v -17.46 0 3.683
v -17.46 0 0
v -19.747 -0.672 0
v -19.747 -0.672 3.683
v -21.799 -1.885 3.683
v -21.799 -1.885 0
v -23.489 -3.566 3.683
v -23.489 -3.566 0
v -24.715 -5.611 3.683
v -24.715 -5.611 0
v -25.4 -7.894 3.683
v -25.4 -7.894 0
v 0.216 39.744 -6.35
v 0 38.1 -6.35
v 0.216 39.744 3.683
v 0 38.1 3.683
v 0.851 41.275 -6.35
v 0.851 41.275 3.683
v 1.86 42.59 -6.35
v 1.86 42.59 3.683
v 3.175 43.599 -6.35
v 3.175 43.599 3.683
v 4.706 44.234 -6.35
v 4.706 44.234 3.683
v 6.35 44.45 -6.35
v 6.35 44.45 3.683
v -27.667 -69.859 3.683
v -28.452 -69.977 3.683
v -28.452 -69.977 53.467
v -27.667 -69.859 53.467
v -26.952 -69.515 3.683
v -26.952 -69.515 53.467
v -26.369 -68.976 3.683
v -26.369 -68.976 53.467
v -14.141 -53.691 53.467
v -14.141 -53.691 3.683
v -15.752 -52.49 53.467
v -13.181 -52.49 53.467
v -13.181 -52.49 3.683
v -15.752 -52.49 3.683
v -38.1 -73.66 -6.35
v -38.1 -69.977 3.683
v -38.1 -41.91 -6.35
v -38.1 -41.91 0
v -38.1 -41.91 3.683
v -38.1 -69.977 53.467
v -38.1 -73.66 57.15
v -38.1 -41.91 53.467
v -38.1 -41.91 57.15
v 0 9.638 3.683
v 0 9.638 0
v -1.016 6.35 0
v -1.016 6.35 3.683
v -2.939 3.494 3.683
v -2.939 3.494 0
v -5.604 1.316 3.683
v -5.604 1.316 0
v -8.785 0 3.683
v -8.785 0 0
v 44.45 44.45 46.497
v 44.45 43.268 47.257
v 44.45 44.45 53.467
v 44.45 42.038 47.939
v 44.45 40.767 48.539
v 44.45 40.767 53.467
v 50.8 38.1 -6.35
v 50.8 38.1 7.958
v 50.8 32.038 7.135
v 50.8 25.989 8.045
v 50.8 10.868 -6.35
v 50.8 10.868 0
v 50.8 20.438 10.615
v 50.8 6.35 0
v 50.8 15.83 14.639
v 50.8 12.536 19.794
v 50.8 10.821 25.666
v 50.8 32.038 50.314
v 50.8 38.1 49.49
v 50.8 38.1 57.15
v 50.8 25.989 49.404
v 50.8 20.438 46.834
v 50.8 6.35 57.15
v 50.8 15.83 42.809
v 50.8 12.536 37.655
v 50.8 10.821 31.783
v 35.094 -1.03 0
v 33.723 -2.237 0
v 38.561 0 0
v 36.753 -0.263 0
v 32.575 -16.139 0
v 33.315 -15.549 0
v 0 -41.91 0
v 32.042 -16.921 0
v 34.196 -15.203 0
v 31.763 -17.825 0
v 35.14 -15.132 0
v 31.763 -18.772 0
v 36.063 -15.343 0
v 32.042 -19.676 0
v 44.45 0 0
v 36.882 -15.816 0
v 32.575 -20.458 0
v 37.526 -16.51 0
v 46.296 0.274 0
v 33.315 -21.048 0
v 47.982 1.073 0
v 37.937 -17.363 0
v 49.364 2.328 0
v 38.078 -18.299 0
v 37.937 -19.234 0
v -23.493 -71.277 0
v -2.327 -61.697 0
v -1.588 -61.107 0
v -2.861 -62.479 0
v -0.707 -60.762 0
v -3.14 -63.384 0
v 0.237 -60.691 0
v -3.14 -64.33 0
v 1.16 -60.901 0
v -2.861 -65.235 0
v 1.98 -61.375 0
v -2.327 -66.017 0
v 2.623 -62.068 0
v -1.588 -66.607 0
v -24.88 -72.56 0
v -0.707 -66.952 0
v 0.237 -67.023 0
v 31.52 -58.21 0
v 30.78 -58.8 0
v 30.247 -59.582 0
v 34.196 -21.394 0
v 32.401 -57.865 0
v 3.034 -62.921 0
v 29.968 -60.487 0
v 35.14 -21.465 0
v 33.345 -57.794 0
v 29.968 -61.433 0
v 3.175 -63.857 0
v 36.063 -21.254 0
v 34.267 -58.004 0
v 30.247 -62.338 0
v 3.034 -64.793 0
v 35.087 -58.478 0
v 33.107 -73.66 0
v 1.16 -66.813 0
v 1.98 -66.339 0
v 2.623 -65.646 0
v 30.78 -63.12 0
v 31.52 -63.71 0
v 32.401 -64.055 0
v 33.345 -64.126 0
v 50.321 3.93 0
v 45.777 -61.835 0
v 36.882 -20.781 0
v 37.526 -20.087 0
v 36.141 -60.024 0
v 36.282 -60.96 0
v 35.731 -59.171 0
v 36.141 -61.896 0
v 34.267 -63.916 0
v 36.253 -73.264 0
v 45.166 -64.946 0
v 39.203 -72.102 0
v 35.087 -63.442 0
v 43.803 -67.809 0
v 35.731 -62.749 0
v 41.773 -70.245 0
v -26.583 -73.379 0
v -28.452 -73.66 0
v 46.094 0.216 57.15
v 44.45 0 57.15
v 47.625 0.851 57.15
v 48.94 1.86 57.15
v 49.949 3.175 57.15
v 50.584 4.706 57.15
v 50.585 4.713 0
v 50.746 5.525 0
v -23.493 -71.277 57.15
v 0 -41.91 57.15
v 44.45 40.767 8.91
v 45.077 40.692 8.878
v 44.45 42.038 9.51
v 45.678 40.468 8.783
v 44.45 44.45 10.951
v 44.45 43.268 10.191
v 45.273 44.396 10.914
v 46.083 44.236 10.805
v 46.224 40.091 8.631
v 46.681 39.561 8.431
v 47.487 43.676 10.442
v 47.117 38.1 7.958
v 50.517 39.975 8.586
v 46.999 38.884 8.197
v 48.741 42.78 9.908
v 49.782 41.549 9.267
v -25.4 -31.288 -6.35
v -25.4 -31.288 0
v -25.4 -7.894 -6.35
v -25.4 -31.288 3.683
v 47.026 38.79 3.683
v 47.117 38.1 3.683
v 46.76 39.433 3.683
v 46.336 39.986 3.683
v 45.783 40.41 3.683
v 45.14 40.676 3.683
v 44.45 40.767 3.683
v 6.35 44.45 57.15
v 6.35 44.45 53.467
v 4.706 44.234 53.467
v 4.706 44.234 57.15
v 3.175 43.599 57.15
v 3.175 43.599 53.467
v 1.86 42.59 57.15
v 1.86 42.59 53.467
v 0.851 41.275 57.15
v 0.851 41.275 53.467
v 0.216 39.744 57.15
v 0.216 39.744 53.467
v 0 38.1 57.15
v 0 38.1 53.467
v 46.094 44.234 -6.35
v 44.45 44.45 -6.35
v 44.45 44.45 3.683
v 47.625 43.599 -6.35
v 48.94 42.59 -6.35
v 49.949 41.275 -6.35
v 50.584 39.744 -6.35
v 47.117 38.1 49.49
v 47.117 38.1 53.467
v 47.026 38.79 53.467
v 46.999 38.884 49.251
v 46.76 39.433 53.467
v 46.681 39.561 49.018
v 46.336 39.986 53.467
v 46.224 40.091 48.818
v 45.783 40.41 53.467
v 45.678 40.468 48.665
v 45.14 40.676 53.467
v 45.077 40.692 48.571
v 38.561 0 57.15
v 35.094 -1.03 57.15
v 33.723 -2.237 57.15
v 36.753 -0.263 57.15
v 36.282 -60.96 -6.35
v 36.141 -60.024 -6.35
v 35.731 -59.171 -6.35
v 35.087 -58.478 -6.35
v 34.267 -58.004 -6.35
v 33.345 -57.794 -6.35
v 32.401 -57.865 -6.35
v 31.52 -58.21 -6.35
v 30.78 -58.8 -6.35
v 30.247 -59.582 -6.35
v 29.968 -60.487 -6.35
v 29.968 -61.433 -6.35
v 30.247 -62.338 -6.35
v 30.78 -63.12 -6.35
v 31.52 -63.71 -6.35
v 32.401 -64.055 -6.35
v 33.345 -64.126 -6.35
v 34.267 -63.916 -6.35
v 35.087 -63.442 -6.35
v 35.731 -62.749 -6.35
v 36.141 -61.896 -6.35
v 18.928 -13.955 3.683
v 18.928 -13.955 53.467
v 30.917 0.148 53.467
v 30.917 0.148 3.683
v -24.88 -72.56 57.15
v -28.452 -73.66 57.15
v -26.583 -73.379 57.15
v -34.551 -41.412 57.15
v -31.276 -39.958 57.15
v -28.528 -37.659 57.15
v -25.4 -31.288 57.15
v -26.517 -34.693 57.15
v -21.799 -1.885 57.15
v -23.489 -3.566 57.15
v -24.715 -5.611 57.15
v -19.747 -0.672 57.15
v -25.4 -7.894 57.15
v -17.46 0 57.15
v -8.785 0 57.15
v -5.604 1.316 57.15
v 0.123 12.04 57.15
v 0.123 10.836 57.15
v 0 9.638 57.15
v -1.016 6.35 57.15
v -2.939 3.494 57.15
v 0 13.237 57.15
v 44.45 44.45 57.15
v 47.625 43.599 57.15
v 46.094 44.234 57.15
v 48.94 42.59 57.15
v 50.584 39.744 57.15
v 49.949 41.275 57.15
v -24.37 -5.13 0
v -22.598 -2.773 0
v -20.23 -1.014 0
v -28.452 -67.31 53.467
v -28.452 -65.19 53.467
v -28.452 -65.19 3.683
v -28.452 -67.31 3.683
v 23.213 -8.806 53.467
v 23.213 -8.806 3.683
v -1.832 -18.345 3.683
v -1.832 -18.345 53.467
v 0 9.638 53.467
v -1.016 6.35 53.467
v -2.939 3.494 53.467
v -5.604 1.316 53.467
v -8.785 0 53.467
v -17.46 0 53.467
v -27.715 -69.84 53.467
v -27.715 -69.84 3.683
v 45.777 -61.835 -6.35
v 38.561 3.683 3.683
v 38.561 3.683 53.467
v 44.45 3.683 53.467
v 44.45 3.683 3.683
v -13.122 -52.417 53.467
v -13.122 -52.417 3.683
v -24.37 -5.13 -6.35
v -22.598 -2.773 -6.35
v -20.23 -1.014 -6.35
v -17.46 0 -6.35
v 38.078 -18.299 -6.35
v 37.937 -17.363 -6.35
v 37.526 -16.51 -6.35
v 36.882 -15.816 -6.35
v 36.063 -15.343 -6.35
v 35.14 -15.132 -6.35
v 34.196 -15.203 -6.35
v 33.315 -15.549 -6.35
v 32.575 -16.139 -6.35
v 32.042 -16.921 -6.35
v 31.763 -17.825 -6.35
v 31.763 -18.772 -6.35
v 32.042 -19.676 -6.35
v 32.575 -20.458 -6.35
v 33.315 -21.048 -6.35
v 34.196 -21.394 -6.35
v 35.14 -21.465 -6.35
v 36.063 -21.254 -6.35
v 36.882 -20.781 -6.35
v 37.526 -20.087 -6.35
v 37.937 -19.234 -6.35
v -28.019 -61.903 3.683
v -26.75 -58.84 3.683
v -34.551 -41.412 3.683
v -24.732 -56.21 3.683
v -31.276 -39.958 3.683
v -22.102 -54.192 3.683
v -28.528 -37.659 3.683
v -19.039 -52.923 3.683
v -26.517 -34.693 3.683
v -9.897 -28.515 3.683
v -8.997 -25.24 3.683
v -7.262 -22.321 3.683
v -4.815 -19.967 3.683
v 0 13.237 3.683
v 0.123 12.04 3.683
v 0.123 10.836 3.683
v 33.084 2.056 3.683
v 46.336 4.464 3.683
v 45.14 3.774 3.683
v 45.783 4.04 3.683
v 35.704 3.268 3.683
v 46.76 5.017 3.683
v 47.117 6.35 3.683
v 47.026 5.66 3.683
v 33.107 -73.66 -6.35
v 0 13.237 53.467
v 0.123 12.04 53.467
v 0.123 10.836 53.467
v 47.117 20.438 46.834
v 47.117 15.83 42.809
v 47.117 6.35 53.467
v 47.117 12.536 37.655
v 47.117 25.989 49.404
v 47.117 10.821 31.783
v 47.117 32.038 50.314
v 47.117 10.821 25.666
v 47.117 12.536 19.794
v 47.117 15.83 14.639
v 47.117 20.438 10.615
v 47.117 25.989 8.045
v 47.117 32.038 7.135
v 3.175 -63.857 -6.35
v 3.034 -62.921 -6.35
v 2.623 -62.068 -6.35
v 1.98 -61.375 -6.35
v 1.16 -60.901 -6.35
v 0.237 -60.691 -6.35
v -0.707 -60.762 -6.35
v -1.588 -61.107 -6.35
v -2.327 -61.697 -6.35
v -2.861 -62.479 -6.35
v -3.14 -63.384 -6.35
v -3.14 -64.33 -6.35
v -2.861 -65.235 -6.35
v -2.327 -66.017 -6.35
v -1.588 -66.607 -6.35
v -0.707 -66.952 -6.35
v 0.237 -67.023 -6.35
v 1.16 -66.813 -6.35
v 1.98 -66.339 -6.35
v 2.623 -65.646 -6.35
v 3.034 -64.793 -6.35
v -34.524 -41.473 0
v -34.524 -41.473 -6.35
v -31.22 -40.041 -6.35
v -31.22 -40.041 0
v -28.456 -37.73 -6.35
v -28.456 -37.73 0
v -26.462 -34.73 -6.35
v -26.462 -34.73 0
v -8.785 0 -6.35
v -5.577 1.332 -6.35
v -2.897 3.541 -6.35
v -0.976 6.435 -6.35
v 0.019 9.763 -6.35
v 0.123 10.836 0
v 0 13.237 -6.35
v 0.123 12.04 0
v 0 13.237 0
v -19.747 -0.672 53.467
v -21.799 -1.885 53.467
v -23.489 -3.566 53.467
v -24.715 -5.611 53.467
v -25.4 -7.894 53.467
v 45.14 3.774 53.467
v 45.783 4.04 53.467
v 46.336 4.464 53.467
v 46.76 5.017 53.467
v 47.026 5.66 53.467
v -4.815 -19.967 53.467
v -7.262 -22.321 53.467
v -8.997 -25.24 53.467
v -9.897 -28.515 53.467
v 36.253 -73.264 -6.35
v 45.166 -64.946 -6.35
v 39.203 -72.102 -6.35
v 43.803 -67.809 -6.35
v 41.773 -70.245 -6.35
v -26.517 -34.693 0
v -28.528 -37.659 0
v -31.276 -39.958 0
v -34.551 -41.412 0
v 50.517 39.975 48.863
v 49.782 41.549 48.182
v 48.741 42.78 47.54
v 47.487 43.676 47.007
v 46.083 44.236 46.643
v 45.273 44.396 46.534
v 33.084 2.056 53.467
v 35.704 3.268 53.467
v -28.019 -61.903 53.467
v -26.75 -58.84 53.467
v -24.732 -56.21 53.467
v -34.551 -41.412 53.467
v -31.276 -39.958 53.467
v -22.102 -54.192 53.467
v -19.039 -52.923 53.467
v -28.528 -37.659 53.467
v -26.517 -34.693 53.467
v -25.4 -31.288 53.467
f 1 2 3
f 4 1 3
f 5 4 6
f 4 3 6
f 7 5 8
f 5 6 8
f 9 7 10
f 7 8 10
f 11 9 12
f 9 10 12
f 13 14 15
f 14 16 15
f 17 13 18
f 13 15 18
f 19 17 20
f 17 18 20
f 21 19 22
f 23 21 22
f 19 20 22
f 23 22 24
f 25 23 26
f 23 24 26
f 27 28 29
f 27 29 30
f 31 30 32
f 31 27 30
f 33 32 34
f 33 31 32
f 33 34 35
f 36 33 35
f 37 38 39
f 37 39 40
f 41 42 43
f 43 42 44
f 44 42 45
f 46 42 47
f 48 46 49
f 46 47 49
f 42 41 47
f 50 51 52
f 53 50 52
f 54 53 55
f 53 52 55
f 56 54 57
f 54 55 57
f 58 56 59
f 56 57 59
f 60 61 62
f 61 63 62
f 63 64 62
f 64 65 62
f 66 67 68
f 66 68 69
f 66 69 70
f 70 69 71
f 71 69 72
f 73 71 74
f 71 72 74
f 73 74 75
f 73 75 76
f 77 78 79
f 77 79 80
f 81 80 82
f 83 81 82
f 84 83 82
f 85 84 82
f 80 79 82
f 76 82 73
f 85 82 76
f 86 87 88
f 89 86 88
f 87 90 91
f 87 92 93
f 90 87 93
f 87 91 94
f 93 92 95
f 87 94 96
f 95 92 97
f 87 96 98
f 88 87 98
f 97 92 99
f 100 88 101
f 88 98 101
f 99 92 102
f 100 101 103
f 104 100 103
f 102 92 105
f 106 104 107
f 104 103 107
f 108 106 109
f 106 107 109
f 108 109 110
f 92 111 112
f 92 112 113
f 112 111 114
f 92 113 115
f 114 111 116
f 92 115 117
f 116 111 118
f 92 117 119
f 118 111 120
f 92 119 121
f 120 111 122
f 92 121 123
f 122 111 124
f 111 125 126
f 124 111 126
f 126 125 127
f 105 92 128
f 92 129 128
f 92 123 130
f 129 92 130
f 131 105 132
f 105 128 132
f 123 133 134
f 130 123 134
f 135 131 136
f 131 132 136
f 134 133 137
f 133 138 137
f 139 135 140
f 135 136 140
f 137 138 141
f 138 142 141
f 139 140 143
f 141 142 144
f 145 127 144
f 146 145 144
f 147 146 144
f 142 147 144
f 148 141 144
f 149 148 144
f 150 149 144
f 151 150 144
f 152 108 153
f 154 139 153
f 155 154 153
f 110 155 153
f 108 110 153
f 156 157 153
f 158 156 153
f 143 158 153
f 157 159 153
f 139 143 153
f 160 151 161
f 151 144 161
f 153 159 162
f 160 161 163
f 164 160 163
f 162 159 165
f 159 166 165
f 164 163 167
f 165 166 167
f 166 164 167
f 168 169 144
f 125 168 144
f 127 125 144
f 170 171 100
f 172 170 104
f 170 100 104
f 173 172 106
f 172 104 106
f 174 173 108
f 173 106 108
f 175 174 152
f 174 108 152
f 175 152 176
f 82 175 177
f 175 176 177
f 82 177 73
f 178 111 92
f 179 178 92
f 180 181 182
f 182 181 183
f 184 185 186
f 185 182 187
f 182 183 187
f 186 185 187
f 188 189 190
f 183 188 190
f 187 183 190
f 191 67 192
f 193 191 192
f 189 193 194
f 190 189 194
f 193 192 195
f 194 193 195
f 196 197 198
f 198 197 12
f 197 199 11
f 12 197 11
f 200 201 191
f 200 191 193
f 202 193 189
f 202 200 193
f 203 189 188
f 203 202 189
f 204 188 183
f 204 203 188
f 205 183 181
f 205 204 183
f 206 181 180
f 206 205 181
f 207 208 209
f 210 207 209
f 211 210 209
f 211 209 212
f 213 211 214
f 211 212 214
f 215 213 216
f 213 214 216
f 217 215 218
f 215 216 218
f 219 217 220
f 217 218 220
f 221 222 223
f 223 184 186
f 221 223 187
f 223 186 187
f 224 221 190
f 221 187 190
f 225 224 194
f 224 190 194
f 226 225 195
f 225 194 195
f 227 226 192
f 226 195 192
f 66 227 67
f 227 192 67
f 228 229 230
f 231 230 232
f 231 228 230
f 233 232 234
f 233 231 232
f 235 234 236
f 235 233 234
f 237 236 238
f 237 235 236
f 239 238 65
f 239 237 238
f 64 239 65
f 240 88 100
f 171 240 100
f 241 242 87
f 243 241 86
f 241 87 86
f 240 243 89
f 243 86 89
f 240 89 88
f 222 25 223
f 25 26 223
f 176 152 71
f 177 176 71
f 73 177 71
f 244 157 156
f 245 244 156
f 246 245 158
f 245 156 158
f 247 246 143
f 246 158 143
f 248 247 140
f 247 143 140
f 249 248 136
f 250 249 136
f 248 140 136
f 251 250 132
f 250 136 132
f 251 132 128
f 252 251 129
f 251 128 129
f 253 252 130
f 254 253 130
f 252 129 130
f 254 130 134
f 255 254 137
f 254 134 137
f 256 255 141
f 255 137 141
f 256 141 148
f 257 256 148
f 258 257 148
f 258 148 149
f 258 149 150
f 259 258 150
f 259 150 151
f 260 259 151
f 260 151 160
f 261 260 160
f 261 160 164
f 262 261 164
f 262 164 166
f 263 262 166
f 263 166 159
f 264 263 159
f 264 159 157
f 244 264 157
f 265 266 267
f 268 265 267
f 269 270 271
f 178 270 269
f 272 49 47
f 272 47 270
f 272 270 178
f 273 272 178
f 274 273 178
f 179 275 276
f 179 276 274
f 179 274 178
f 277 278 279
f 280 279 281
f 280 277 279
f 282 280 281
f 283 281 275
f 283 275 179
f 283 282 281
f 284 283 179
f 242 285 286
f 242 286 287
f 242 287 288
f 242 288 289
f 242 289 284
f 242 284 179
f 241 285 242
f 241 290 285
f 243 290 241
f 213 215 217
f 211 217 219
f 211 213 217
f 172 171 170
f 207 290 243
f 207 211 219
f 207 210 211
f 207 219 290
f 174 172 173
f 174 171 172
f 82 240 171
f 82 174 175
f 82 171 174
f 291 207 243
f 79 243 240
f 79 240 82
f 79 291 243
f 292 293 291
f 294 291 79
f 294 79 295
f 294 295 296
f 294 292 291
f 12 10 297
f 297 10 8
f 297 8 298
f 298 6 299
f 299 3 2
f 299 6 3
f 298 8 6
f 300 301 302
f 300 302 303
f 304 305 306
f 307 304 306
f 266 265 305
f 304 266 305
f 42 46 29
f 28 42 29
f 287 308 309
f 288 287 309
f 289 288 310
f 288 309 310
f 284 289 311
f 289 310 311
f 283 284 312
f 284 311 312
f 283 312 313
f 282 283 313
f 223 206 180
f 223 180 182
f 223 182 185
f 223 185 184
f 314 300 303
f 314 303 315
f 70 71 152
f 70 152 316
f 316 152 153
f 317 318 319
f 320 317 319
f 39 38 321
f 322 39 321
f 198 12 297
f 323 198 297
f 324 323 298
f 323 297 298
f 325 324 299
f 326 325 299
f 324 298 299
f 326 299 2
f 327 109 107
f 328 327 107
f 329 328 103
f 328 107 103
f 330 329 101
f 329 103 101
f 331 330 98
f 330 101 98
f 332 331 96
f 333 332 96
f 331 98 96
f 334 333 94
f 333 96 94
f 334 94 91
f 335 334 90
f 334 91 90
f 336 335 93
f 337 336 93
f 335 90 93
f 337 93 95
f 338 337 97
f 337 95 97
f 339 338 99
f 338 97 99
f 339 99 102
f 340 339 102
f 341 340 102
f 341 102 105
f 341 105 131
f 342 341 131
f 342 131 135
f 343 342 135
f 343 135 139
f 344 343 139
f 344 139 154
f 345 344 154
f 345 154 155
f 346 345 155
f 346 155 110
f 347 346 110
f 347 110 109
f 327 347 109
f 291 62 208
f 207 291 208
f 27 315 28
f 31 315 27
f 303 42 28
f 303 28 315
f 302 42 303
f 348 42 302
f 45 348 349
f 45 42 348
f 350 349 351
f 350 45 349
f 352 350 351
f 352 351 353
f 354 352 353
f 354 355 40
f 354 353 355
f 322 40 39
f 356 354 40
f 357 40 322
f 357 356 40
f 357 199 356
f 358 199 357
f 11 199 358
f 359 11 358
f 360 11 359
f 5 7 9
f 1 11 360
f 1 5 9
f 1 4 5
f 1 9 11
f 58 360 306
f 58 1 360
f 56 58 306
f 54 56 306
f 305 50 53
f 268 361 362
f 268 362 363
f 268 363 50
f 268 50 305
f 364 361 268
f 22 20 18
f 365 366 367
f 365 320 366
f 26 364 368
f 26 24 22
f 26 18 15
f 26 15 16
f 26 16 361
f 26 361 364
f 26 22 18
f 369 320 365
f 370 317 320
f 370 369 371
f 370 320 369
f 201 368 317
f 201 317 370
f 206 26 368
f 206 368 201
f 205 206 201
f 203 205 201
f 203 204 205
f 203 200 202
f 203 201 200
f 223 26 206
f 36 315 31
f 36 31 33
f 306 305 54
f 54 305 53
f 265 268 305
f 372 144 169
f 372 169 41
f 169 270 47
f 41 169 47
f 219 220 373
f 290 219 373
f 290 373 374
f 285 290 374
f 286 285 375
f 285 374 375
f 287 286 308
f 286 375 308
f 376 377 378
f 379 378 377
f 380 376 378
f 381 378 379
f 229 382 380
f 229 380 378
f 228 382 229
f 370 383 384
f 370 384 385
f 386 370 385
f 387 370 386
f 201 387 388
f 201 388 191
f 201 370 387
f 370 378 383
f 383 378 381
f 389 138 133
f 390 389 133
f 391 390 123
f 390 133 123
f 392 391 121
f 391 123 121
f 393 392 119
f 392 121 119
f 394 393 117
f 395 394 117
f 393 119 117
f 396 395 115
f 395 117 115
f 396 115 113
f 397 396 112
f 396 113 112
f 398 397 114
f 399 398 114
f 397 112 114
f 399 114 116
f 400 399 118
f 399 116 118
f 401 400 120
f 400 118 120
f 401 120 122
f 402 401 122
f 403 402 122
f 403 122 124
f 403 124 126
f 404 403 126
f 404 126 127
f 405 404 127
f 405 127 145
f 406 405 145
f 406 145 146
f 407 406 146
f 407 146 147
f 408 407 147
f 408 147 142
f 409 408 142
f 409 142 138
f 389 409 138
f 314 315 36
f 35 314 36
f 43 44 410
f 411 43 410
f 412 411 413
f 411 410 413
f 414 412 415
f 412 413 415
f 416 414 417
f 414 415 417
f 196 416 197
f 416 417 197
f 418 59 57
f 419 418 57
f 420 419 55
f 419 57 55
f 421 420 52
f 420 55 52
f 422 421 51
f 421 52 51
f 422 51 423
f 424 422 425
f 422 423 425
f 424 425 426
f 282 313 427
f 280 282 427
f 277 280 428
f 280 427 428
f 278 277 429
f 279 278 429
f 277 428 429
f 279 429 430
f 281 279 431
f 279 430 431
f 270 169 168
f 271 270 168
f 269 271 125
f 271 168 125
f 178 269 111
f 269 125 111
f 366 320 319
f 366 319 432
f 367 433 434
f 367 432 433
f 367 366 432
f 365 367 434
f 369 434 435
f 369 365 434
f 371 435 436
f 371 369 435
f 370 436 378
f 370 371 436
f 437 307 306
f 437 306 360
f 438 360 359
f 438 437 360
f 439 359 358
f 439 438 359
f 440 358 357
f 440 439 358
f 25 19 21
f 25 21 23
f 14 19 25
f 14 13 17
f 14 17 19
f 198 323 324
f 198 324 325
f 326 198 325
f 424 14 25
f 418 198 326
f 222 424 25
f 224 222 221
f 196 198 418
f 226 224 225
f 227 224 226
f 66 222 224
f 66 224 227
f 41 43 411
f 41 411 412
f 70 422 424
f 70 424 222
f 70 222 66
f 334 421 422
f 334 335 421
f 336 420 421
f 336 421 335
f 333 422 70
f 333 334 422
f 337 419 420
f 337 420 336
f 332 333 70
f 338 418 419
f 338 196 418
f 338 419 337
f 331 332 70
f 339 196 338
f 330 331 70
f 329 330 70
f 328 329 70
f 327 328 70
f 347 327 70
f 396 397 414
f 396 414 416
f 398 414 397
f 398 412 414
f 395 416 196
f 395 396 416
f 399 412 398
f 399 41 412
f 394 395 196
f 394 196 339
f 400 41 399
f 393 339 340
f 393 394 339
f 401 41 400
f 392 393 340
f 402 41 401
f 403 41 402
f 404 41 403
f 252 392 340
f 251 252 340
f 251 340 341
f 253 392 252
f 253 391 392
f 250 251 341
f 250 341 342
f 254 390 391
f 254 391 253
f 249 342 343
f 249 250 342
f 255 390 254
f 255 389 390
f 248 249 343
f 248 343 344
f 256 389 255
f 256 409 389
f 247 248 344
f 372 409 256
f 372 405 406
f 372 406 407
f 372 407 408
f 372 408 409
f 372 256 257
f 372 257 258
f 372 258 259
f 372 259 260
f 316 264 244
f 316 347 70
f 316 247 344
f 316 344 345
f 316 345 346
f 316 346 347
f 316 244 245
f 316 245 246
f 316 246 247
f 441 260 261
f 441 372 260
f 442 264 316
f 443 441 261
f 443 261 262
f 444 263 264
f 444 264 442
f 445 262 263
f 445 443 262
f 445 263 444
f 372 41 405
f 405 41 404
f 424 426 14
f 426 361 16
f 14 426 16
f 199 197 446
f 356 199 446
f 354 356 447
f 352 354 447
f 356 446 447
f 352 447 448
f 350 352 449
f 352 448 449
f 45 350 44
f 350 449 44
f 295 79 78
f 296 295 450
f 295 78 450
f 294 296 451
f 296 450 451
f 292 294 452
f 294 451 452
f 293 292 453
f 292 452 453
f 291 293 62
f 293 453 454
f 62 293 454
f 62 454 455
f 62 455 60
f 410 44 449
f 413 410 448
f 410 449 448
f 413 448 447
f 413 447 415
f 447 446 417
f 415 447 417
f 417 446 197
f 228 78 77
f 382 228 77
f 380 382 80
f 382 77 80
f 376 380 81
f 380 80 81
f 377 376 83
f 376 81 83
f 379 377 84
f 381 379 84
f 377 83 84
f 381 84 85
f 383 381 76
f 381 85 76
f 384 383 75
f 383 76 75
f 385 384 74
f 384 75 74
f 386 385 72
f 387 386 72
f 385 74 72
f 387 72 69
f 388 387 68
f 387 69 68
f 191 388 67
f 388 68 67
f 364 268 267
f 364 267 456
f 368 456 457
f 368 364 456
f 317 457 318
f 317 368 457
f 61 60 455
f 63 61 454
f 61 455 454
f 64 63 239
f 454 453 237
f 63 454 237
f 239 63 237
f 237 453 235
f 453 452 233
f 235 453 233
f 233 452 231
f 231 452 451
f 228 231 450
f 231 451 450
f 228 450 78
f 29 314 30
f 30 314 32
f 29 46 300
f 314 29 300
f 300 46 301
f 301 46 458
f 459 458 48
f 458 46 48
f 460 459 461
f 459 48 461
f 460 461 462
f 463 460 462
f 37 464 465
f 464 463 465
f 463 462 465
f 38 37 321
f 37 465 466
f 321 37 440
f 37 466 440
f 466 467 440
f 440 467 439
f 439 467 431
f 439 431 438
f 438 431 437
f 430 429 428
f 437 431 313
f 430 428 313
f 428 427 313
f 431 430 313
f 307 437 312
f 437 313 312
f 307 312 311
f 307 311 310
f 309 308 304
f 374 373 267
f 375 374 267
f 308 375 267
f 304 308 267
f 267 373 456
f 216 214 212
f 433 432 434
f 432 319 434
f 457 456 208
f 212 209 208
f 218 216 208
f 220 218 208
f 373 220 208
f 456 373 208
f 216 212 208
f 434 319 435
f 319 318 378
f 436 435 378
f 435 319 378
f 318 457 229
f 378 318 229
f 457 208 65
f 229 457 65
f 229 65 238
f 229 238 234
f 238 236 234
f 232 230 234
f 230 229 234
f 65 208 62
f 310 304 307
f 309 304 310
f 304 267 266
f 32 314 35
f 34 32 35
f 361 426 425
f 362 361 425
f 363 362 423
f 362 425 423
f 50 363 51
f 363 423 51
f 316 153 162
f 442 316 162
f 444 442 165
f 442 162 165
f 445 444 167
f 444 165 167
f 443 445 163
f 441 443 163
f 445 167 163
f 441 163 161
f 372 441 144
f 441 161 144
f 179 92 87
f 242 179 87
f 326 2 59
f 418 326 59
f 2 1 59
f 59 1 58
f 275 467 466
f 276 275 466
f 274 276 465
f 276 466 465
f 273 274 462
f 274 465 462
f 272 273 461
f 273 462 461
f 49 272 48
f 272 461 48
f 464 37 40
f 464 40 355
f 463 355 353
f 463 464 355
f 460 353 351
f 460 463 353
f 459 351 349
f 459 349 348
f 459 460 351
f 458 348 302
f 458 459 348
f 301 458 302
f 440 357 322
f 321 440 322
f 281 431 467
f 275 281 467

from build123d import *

# Parameters (mm, degrees)
F1_DEPTH    = 57.15
F2_T        = 3.683
F2_T3_DEPTH = 64.516
F4_DEPTH    = 25.4
F6_DEPTH    = 6.35
F7_R        = 3.175
F8_DEPTH    = 25.4
F10_DEPTH   = 56.642


# Not quite as in the source:
# - a shell that OpenCascade refuses in one call is made with other operations: the cavity is built on its own and cut out


with BuildPart() as f1:
    # F0 (on Top) → F1 (new body)
    with BuildSketch(Plane.XY):
        with BuildLine():
            ThreePointArc((33.7229068752, -2.2373507569), (35.8958962, -0.5864150612), (38.5611520326, 0))
            Line((38.5611520326, 0), (44.45, 0))
            ThreePointArc((44.45, 0), (48.9401280605, 1.8598719395), (50.8, 6.35))
            Line((50.8, 6.35), (50.8, 38.1))
            ThreePointArc((50.8, 38.1), (48.9401280605, 42.5901280605), (44.45, 44.45))
            Line((44.45, 44.45), (6.35, 44.45))
            ThreePointArc((6.35, 44.45), (1.8598719395, 42.5901280605), (0, 38.1))
            Line((0, 38.1), (0, 13.2369613275))
            ThreePointArc((0, 13.2369613275), (0.138072898, 11.4377303868), (0, 9.6384994461))
            ThreePointArc((0, 9.6384994461), (-2.9389427728, 3.4941811086), (-8.7853716686, 0))
            Line((-8.7853716686, 0), (-17.4601711333, 0))
            ThreePointArc((-17.4601711333, 0), (-22.6964673635, -2.6732403398), (-25.4, -7.893960923))
            Line((-25.4, -7.893960923), (-25.4, -31.2883965671))
            ThreePointArc((-25.4, -31.2883965671), (-29.8218894142, -38.9045945069), (-38.1, -41.91))
            Line((-38.1, -41.91), (-38.1, -73.66))
            Line((-38.1, -73.66), (-28.4519677815, -73.66))
            ThreePointArc((-28.4519677815, -73.66), (-25.7012193429, -73.0332755505), (-23.4934508416, -71.276813552))
            Line((-23.4934508416, -71.276813552), (0, -41.91))
            Line((0, -41.91), (33.7229068752, -2.2373507569))
        make_face()
    extrude(amount=F1_DEPTH)

    # F2: shell of thickness 3.683, made by hand


with BuildPart() as f2_core1:
    # F2_t2: copy of F1
    add(f1.part)

    # the walls: a layer under each face that stays
    f2_faces = [f2_core1.faces().sort_by_distance(p)[0] for p in [
        (35.8958962, -0.5864150612, 28.575),
        (6.35, -14.605, 57.15),
        (-11.7467254208, -56.593406776, 28.575),
        (-25.7012193429, -73.0332755505, 28.575),
        (-33.2759838908, -73.66, 28.575),
        (48.9401280605, 42.5901280605, 28.575),
        (50.8, 22.225, 28.575),
        (48.9401280605, 1.8598719395, 28.575),
        (6.35, -14.605, 0),
        (41.5055760163, 0, 28.575),
        (16.8614534376, -22.0736753784, 28.575),
    ]]
    thicken(f2_faces, amount=-F2_T, mode=Mode.SUBTRACT)

    # F2_s4 → F2_t3 (cut)
    with BuildSketch(Plane.XY.offset(-3.683)):
        Polygon((0.0568212202, -41.9568608842), (-2.8759398252, -39.6092481399), (-2.8416905769, -39.5664365795), (-2.8061821913, -39.524663439), align=None)
    extrude(amount=F2_T3_DEPTH, mode=Mode.SUBTRACT)


with BuildPart() as f1_1:
    add(f1.part)

    # what is left inside the walls is the cavity
    f2_cavity = [f2_core1.part.solids().sort_by_distance(p)[0] for p in [
        (15.160625, 19.021778, 3.71983),
    ]]
    add(f2_cavity, mode=Mode.SUBTRACT)

    # F3 (on face) → F4 (cut)
    with BuildSketch(Plane.YZ.offset(50.8)):
        with BuildLine():
            ThreePointArc((38.1, 7.9580365134), (49.4216390683, 15.7128126042), (53.7828262711, 28.7241964505))
            ThreePointArc((53.7828262711, 28.7241964505), (49.4216390683, 41.7355802968), (38.1, 49.4903563877))
            Line((38.1, 49.4903563877), (38.1, 7.9580365134))
        make_face()
        with BuildLine():
            Line((38.1, 7.9580365134), (38.1, 49.4903563877))
            ThreePointArc((38.1, 49.4903563877), (10.6028262711, 28.7241964505), (38.1, 7.9580365134))
        make_face()
    extrude(amount=-F4_DEPTH, mode=Mode.SUBTRACT)

    # F5 (on face) → F6 (join)
    with BuildSketch(Plane(origin=(0, 0, 0), x_dir=(1, 0, 0), z_dir=(0, 0, -1))):
        with BuildLine():
            Line((33.1074998051, 73.66), (-28.4519677815, 73.66))
            ThreePointArc((-28.4519677815, 73.66), (-25.7012193429, 73.0332755505), (-23.4934508416, 71.276813552))
            Line((-23.4934508416, 71.276813552), (0, 41.91))
            Line((0, 41.91), (33.7229068752, 2.2373507569))
            ThreePointArc((33.7229068752, 2.2373507569), (35.8958962, 0.5864150612), (38.5611520326, 0))
            Line((38.5611520326, 0), (44.45, 0))
            ThreePointArc((44.45, 0), (47.9823010709, -1.0731307441), (50.3207058028, -3.9298112931))
            Line((50.3207058028, -3.9298112931), (45.77730068, 61.8352975433))
            ThreePointArc((45.77730068, 61.8352975433), (41.7727672909, 70.2445645778), (33.1074998051, 73.66))
        make_face()
        with BuildLine():
            Line((-28.4519677815, 73.66), (-38.1, 73.66))
            Line((-38.1, 73.66), (-38.1, 41.91))
            ThreePointArc((-38.1, 41.91), (-29.7548118209, 38.9847975987), (-25.4, 31.2883965671))
            Line((-25.4, 31.2883965671), (-25.4, 7.893960923))
            ThreePointArc((-25.4, 7.893960923), (-22.5976268538, 2.7726551632), (-17.4601711333, 0))
            Line((-17.4601711333, 0), (-8.7853716686, 0))
            ThreePointArc((-8.7853716686, 0), (-1.8289491462, -4.9169285395), (0, -13.2369613275))
            Line((0, -13.2369613275), (0, -38.1))
            ThreePointArc((0, -38.1), (1.8598719395, -42.5901280605), (6.35, -44.45))
            Line((6.35, -44.45), (44.45, -44.45))
            ThreePointArc((44.45, -44.45), (48.9401280605, -42.5901280605), (50.8, -38.1))
            Line((50.8, -38.1), (50.8, -10.8675230294))
            Line((50.8, -10.8675230294), (50.3207058028, -3.9298112931))
            ThreePointArc((50.3207058028, -3.9298112931), (47.9823010709, -1.0731307441), (44.45, 0))
            Line((44.45, 0), (38.5611520326, 0))
            ThreePointArc((38.5611520326, 0), (35.8958962, 0.5864150612), (33.7229068752, 2.2373507569))
            Line((33.7229068752, 2.2373507569), (0, 41.91))
            Line((0, 41.91), (-23.4934508416, 71.276813552))
            ThreePointArc((-23.4934508416, 71.276813552), (-25.7012193429, 73.0332755505), (-28.4519677815, 73.66))
        make_face()
    extrude(amount=F6_DEPTH)

    # F7 (on face) → F8 (cut)
    with BuildSketch(Plane.XY):
        with Locations((0, -63.8569965959)):
            Circle(F7_R)
        with Locations((33.1074998051, -60.96)):
            Circle(F7_R)
        with Locations((34.9028557539, -18.2985700667)):
            Circle(F7_R)
    extrude(amount=-F8_DEPTH, mode=Mode.SUBTRACT)

    # F9 (on face) → F10 (join)
    with BuildSketch(Plane.XY.offset(57.15)):
        with BuildLine():
            Line((-9.8974186925, -28.5147787669), (-13.1322266534, -52.4904169142))
            Line((-13.1322266534, -52.4904169142), (23.2126582414, -8.8060172275))
            Line((23.2126582414, -8.8060172275), (-1.8316966669, -18.3445471934))
            ThreePointArc((-1.8316966669, -18.3445471934), (-7.2620315182, -22.3213661397), (-9.8974186925, -28.5147787669))
        make_face()
        with BuildLine():
            Line((-28.4519677815, -65.1904169142), (-28.4519677815, -67.31))
            Line((-28.4519677815, -67.31), (-27.7152992785, -69.8403045535))
            Line((-27.7152992785, -69.8403045535), (-13.1322266534, -52.4904169142))
            Line((-13.1322266534, -52.4904169142), (-15.7519677815, -52.4904169142))
            ThreePointArc((-15.7519677815, -52.4904169142), (-24.7322239026, -56.2101607932), (-28.4519677815, -65.1904169142))
        make_face()
    extrude(amount=-F10_DEPTH)


solid = f1_1.part
